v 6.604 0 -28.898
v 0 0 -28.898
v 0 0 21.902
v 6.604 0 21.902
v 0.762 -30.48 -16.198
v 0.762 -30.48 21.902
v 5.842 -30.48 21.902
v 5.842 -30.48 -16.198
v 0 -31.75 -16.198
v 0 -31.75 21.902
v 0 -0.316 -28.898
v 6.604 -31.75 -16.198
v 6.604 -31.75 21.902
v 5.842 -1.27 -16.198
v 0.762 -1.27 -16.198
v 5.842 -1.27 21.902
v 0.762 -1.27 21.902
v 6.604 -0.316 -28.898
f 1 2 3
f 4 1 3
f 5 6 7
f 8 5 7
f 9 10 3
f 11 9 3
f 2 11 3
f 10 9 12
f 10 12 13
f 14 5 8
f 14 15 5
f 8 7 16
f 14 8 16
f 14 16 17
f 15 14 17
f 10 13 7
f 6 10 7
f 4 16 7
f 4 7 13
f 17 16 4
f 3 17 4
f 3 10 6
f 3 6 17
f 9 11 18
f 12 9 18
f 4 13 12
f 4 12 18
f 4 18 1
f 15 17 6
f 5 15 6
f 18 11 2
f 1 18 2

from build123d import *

# Parameters (mm, degrees)
F0_W     = 31.75
F0_H     = 50.8
F1_DEPTH = 6.604
F2_SIZE2 = 31.433603
F2_SIZE  = 12.7
F4_DEPTH = 38.1


with BuildPart() as f1:
    # F0 (on Right) → F1 (new body)
    with BuildSketch(Plane.YZ):
        with Locations((-15.875, -3.497973)):
            Rectangle(F0_W, F0_H)
    extrude(amount=F1_DEPTH)

    # F2
    f2_edges = [f1.edges().sort_by_distance(p)[0] for p in [
        (3.302, -31.75, -28.897973),
    ]]
    chamfer(f2_edges, length=F2_SIZE, length2=F2_SIZE2)

    # F3 (on face) → F4 (cut)
    with BuildSketch(Plane.XY.offset(21.902027)):
        Polygon((0.762, -30.48), (3.302, -30.48), (5.842, -30.48), (5.842, -1.27), (3.302, -1.27), (0.762, -1.27), align=None)
    extrude(amount=-F4_DEPTH, mode=Mode.SUBTRACT)


solid = f1.part
